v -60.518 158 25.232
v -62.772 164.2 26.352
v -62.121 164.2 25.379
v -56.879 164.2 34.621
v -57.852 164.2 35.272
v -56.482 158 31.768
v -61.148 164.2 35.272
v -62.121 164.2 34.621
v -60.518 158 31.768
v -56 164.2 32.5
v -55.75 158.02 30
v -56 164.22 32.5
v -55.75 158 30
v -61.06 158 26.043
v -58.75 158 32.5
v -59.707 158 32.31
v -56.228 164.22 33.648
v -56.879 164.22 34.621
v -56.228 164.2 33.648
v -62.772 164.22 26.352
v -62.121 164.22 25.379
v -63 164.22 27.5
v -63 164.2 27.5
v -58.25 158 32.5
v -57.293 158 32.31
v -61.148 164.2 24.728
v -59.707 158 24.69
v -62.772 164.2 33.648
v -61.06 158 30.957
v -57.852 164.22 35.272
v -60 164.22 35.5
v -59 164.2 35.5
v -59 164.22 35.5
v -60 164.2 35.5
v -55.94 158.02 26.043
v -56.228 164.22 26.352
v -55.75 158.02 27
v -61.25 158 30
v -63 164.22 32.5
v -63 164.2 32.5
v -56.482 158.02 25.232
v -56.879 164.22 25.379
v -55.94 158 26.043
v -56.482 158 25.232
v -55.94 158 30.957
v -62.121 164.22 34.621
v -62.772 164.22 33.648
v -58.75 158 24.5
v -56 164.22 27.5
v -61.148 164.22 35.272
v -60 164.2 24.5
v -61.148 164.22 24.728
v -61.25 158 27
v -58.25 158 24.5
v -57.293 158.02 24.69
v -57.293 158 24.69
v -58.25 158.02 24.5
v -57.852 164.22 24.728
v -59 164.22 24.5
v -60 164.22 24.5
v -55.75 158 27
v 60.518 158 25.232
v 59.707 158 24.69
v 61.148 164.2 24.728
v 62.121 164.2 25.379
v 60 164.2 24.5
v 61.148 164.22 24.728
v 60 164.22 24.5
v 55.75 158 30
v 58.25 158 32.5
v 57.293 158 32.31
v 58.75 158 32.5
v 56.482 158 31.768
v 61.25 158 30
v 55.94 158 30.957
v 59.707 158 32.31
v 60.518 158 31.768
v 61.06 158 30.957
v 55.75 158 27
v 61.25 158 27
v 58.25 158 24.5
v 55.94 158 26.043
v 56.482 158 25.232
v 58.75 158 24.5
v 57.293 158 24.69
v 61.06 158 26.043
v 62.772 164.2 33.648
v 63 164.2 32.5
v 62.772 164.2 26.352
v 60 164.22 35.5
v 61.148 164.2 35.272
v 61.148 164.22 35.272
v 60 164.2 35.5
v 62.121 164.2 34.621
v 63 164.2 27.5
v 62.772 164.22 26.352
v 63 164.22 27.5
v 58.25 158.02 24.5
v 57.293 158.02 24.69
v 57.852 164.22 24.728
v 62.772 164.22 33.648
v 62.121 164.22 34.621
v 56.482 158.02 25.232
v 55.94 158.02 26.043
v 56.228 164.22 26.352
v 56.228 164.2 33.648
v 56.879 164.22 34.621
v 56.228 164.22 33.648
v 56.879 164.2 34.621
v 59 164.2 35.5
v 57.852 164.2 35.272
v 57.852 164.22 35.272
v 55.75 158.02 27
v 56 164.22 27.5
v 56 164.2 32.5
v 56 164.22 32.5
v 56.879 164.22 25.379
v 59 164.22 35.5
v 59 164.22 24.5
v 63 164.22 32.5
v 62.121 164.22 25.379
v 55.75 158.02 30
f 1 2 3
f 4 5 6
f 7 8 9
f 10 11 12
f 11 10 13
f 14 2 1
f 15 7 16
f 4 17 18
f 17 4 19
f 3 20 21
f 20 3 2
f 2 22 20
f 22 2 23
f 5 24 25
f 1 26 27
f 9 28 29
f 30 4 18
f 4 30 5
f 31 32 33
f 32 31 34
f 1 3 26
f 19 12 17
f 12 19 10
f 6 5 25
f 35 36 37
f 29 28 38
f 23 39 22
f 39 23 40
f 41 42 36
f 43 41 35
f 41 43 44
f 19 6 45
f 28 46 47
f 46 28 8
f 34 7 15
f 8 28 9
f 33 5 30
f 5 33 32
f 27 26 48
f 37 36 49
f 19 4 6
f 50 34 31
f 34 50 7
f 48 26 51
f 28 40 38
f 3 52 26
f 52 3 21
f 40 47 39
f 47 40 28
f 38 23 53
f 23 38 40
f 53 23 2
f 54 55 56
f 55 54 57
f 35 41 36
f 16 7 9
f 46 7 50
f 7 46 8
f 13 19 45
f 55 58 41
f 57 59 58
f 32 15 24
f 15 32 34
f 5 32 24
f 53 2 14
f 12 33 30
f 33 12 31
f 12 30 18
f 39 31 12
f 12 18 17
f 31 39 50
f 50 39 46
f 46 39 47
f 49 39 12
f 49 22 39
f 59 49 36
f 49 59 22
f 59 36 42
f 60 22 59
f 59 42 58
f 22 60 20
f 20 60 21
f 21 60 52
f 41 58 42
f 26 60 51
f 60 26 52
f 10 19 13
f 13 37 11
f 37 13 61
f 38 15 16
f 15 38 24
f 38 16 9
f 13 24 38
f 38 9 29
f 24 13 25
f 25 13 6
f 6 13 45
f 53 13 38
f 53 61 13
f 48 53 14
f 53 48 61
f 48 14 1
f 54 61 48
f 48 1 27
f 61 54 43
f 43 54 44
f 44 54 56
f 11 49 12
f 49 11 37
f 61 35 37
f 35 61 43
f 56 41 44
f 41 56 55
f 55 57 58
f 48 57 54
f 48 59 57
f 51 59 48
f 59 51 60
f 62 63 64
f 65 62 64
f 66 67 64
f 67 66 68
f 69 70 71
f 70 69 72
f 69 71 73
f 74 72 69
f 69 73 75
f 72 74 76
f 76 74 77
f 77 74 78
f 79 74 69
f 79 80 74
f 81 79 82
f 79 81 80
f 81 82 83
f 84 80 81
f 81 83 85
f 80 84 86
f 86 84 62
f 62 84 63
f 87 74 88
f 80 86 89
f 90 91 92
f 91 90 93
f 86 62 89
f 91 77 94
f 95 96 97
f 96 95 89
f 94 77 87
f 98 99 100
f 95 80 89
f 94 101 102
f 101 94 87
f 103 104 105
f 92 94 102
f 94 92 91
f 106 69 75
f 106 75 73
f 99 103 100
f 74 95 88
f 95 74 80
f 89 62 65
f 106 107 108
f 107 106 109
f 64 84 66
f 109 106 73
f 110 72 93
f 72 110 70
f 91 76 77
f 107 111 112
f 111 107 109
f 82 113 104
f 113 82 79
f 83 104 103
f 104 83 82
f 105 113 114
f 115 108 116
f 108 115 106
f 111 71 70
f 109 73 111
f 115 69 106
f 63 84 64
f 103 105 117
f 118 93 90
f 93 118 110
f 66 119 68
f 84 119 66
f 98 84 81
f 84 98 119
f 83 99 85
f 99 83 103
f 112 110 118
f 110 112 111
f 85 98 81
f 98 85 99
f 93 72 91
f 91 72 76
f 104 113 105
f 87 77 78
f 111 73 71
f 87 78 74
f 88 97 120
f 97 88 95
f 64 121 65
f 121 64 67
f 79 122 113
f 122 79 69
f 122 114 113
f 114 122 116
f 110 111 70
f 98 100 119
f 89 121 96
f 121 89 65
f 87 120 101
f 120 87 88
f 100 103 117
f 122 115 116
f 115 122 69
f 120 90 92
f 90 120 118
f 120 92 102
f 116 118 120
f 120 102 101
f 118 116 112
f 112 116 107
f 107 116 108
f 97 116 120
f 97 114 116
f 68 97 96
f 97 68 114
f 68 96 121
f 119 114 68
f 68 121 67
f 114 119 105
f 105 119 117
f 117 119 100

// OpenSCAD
// file: ../lib.scad
// ===== 공용 프리미티브 (params 의존 없음 — use로 포함. 함정 1) =====

// 두 점을 잇는 캡슐. 끝단이 od/2 만큼 뻗는다 (함정 3)
module rod(p1, p2, od, fn = 56)
    hull() { translate(p1) sphere(d = od, $fn = fn);
             translate(p2) sphere(d = od, $fn = fn); }

function mir(p, s = 1) = [s * p.x, p.y, p.z];

// --- 라운디드 사각 2D 폴리곤 (CCW) ---
function arc_pt(cx, cy, r, a) = [cx + r * cos(a), cy + r * sin(a)];
function rrpts(w, h, r, n = 4) =
    let (x = w / 2 - r, y = h / 2 - r)
    concat(
        [for (i = [0:n]) arc_pt( x, -y, r, -90 + 90 * i / n)],
        [for (i = [0:n]) arc_pt( x,  y, r,   0 + 90 * i / n)],
        [for (i = [0:n]) arc_pt(-x,  y, r,  90 + 90 * i / n)],
        [for (i = [0:n]) arc_pt(-x, -y, r, 180 + 90 * i / n)]);

// y 위치의 XZ 단면 슬래브 (중심 x0/zc, 폭 w/높이 h, 모서리 r).
// 회전 매핑: 2D x→차량 X, 2D y→차량 Z, 돌출 +z→−Y (y..y+0.02 전방 전용, 함정 20)
module slabr(y, x0, w, h, zc, r)
    translate([x0, y + 0.02, zc]) rotate([90, 0, 0])
        linear_extrude(0.02) polygon(rrpts(w, h, r));

// 단면 체인 loft: sec = [[y, x0, w, h, zc, r], ...]
module loftr(sec)
    for (i = [0 : len(sec) - 2])
        hull() {
            slabr(sec[i][0],     sec[i][1],     sec[i][2],     sec[i][3],     sec[i][4],     sec[i][5]);
            slabr(sec[i + 1][0], sec[i + 1][1], sec[i + 1][2], sec[i + 1][3], sec[i + 1][4], sec[i + 1][5]);
        }

// 라운디드 박스 (z0..z1 수직, 평면 모서리 r)
module rbox(xc, yc, z0, z1, dx, dy, r, fn = 32)
    hull() for (px = [-1, 1], py = [-1, 1])
        translate([xc + px * (dx / 2 - r), yc + py * (dy / 2 - r), z0])
            cylinder(r = r, h = z1 - z0, $fn = fn);

// --- NACA 계열 에어포일 (LE 원점, 2D +x = 현 방향) ---
function _yt(x, c, t) = 5 * t * c * (0.2969*sqrt(x) - 0.1260*x - 0.3516*x*x
    + 0.2843*x*x*x - 0.1036*x*x*x*x);
function _yc(x, c, m) = 4 * m * c * x * (1 - x);
function naca_pts(c, t, m, n = 12) =
    concat(
        [for (i = [0:n])     let (x = i / n)     [x*c,  _yt(x, c, t) + _yc(x, c, m)]],
        [for (i = [n-1:-1:0]) let (x = i / n)    [x*c, -_yt(x, c, t) + _yc(x, c, m)]]);

// 슬라이스 3D 링: v=[x, yle, zle, c, aoa, th, cam] → 받각 회전된 naca 점의 링
// (th/cam은 mm — 현 대비 비율로 정규화)
function wring(v, n = 12) =
    let (c = v[3], t = v[5] / c, m = v[6] / c, pts = naca_pts(c, t, m, n),
         ca = cos(v[4]), sa = sin(v[4]))
    // 코드 방향 (ca,sa) + 두께/캠버 수직 방향 (-sa,ca) — 2D y 누락 금지
    [for (p = pts) [v[0], v[1] + p[0] * ca - p[1] * sa, v[2] + p[0] * sa + p[1] * ca]];

// 진짜 로프트 윙 — polyhedron 스트립. hull 체인은 캠버진 하면을 볼록 껍질로
// 채워(LE→TE 직선 웨지) 요소가 처지므로 쓰지 않는다
module wing3(sl, n = 12) {
    rings = [for (v = sl) wring(v, n)];
    ns = len(rings);
    m = len(rings[0]);
    pts = [for (r = rings, p = r) p];
    function ix(i, k) = i * m + (k % m);
    faces = concat(
        // 측면 스트립 (사중면 → 삼각형 2) — 외향 노멀 권선(캡과 일치)
        [for (i = [0 : ns - 2], k = [0 : m - 1])
            each [[ix(i, k), ix(i, k + 1), ix(i + 1, k + 1)],
                  [ix(i, k), ix(i + 1, k + 1), ix(i + 1, k)]]],
        // 끝 캡 (링은 단순 폴리곤 — 팬 삼각분할)
        [for (k = [1 : m - 2]) [ix(0, 0), ix(0, k + 1), ix(0, k)]],
        [for (k = [1 : m - 2]) [ix(ns - 1, 0), ix(ns - 1, k), ix(ns - 1, k + 1)]]
    );
    polyhedron(points = pts, faces = faces, convexity = 4);
}

// 반쪽 슬라이스 → x-대칭 전체. 규약: half는 센터(x=0)→팁 순서(내림차순 x).
// 결과는 x 오름차순 체인. x=0 센터만 중복 제외 (그 외 전부 미러)
function wsym(half) =
    concat([for (i = [len(half) - 1 : -1 : 0]) half[i]],
           [for (i = [0 : len(half) - 1]) if (abs(half[i][0]) > 1e-9)
               concat([-half[i][0]], [for (j = [1 : len(half[i]) - 1]) half[i][j]])]);

// 환(링), 축 Z
module ann(r_in, r_out, h, fn = 96)
    difference() { cylinder(r = r_out, h = h, center = true, $fn = fn);
                   cylinder(r = r_in,  h = h + 2, center = true, $fn = fn); }

// 리스트 전체 x반전+순서 역행 (센터 구간 없는 플랩 등 — 좌우 별도 wing3 호출용).
// x반전만 하면 행렬식이 음수가 되어 권선이 뒤집힌다 → 순서 역행으로 상쇄
function msym(half) =
    [for (i = [len(half) - 1 : -1 : 0])
        concat([-half[i][0]], [for (j = [1 : len(half[i]) - 1]) half[i][j]])];
// file: ../params.scad
// =====================================================================
// F1 그랜드파이언스 카 1:10 — 전체 파라미터 (유일한 수정 지점)
// 좌표계: +Y 전방, +X 좌측, +Z 상방, 지면 z=0, 원점=휠베이스 중심
// 전장 558 (y -268..+278), 전폭 194, 휠베이스 360, 타이어 OD 72 (720mm)
// 30부품. loftr 단면 = [y, x0, w, h, zc, r] (XZ 단면, y..y+0.02 슬래브)
// wing3 슬라이스 = [x, yle, zle, c, aoa, th, cam]
//   aoa: 현 방향의 X축 회전각. 전방 받각 요소는 165~170 (TE가 뒤+위)
// =====================================================================
$fn = 96;

// -- 휠/액슬 (실차 720mm 타이어, 18인치 림, 트랙 F1600/R1550) --
AXF_Y = 180;   AXR_Y = -180;
WHF_X = 80;    WHR_X = 77.5;
WH_Z  = 36;
TIRF_W = 30.5; TIRR_W = 40.5;  TIR_R = 36;
TIR_FN = 288;                 // 타이어 회전체 해상도
RIM_R = 23.2;  RIM_T = 1.0;   // 림 배럴 반경/두께
RIM_LF = 12.4; RIM_LR = 17.4; // 림 배럴 반폭
HUB_BORE = 7.0; STUB_D = 6.2; // 방사 간극 0.4
DISC_R = 15.5;                // 브레이크 디스크

// -- 바디 공통 레벨 --
FLO_Z0 = 2.0;  FLO_Z1 = 5.5;  // 플로어 (두께 3.5)
BOD_Z0 = 5.65;                // 샤시/카버/기어박스 바닥 (플로어 위 0.15)
J = 0.15;                     // 부품 접합 기본 간극
ARM_OD = 3.4;                 // 서스펜션 암 캡슐 직경

// ===== 01 플로어 =====
FLOOR_SEC = [
    [132,    0,  92, 3.5, 3.75, 1.5], [100, 0, 118, 3.5, 3.75, 1.5],
    [60,     0, 130, 3.5, 3.75, 2.0], [10,  0, 132, 3.5, 3.75, 2.0],
    [-60,    0, 128, 3.5, 3.75, 2.0], [-120, 0, 112, 3.5, 3.75, 2.0],
    [-161.85, 0, 100, 3.5, 3.75, 2.0]];

// ===== 02 디퓨저 (램프 + 스트레이크는 부품 내부) =====
DIFF_SEC = [
    [-230,   0, 100, 10.0, 11.0, 1.5], [-215, 0, 100, 8.0,  9.0, 1.5],
    [-190,   0, 100,  6.0,  6.2, 1.5], [-162.0, 0, 100, 4.0, 4.15, 1.5]];
DIFF_TOP = [[-175, 7.8], [-205, 11.9], [-228, 15.6]];  // (y, 램프 상면 z)

// ===== 03 플로어 에지 윙 =====
FEW_SEC = [   // [y, x0, w, h, zc, r] — x0 부호로 좌우
    [55,   63.5, 3.0, 2.0, 6.65, 1.0], [-5,  65.5, 3.0, 5.5, 8.40, 1.5],
    [-70,  63.0, 3.0, 4.0, 7.65, 1.5], [-120, 58.0, 3.0, 3.0, 7.15, 1.5]];
FEW2_SEC = [
    [100, 57.0, 2.5, 1.5, 6.40, 0.8], [60, 60.0, 2.5, 2.0, 6.65, 0.8]];

// ===== 04 노우즈 =====
NOSE_SEC = [
    [95,   0, 38, 28, 25.3, 12], [100,  0, 38, 29, 25.3, 12],
    [115,  0, 36, 28, 23.8, 11], [135,  0, 31, 24, 21.3,  9],
    [160,  0, 27, 20, 18.3,  8], [185,  0, 23, 17, 15.8,  7],
    [205,  0, 20, 15, 14.3,  6], [224,  0, 17, 12, 12.3,  5],
    [242,  0, 14,  9, 10.8,  4], [258,  0, 10,  7, 10.1,  3],
    [272,  0,  4.5, 4.5, 9.8, 2], [273.5, 0, 1.2, 1.2, 9.8, 0.6]];

// ===== 05 샤시(모노코크) + 콕핏 컷 =====
CHAS_SEC = [
    [-34.85, 0, 46, 44, 27.65, 15], [-10, 0, 48, 46, 28.65, 15],
    [20,     0, 48, 44, 27.65, 15], [60,  0, 46, 40, 25.65, 14],
    [94.85,  0, 42, 34, 22.65, 12]];
CKP_CUT = [[62, 0, 34, 32, 46, 3], [-30, 0, 34, 30, 45, 3]];

// ===== 06 엔진 커버 + 샤크핀 =====
COV_SEC = [
    [-152,   0,  8, 14, 35.65,  6], [-140, 0, 12, 18, 32.65,  7],
    [-120,   0, 18, 24, 29.65,  9], [-95,  0, 26, 30, 26.15, 11],
    [-70,    0, 34, 36, 25.65, 13], [-50,  0, 40, 40, 25.65, 14],
    [-35.15, 0, 44, 42, 26.65, 15]];
FIN_SEC = [
    [-162, 0, 2.2, 44, 62.0, 1], [-120, 0, 2.5, 30, 56.0, 1],
    [-92.2, 0, 2.5, 10, 45.0, 1]];

// ===== 07 에어박스 (험프 + 인테이크 링) =====
ABX_SEC = [
    [-92, 0, 14, 17, 50.00, 6], [-68, 0, 20, 24, 56.60, 8],
    [-46, 0, 22, 26, 59.60, 8], [-34, 0, 22, 13, 56.30, 6]];
ABX_RING_C = [0, -45, 73.5];  ABX_RING_R = 11;  ABX_RING_T = 4.5;
ABX_RING_SZ = 0.72;

// ===== 08 사이드포드 (x0=±41.5) =====
SPOD_X0 = 41.5;
SPOD_SEC = [   // [y, w, h, zc, r]
    [38,   34, 26, 18.65, 8], [5,   34, 28, 19.65, 9], [-25,  34, 26, 18.65, 9],
    [-55,  32, 21, 18.15, 8], [-80, 30, 15, 17.15, 8], [-100, 26,  9, 16.15, 7]];
SPOD_INLET = [24, 18, 19, 2.3];  // 컷: w, h, zc, 깊이

// ===== 09 할로 =====
HALO_N = 28;  HALO_OD = 9;
HALO_RX = 22; HALO_RY = 44; HALO_CY = 12;  // 타원 계획면(평면도)
HALO_Z0 = 75; HALO_ZA = 2;                 // z(t) = Z0 + ZA*cos(t)

// ===== 10/11/12/13 프런트 윙 =====
FW_MAIN_HALF = [   // 반쪽(x≤0) — wsym()로 전체화
    [0,    258.3, 2.4, 20, 170, 1.4, 2.0],
    [-16,  259.0, 3.4, 27, 165, 1.6, 2.4],
    [-40,  260.0, 3.6, 40, 166, 1.8, 2.8],
    [-60,  257.0, 4.0, 37, 167, 1.7, 2.6],
    [-80,  258.0, 4.4, 31, 166, 1.6, 2.2],
    [-95.2, 263.0, 4.6, 26, 166, 1.5, 1.8]];
FW_F1_HALF = [
    [-16,  253.0, 8.0, 22, 155, 1.3, 4.0],
    [-40,  250.5, 8.2, 26, 156, 1.4, 4.2],
    [-60,  249.5, 8.4, 26, 157, 1.4, 4.2],
    [-80,  250.0, 8.6, 24, 158, 1.4, 4.0],
    [-95.2, 254.0, 8.8, 21, 158, 1.3, 3.5]];
FW_F2_HALF = [
    [-16,  258.0, 12.4, 17, 147, 1.2, 4.5],
    [-40,  255.5, 12.6, 20, 148, 1.3, 4.8],
    [-60,  254.5, 12.8, 20, 149, 1.3, 4.8],
    [-80,  254.5, 13.0, 19, 150, 1.3, 4.5],
    [-95.2, 258.0, 13.2, 17, 150, 1.2, 4.0]];
FW_EP_X = 96.3;  FW_EP_T = 1.5;   // 엔드플레이트 x 중심/두께
FW_EP_PTS = [    // (y,z) 아웃라인
    [226, 1.5], [266, 1.5], [266, 8], [263, 24.5], [252, 24.5],
    [244, 17], [233, 15], [226, 9]];
FW_MT_SEC = [   // 마운트 플레이트 [y, x0(±2.6), w, h, zc, r] — 노우즈 저면 라운딩 회피
    [244, 2.6, 1.6, 1.8, 5.25, 0.5], [250, 2.6, 1.6, 1.8, 5.25, 0.5]];

// ===== 14 리어 윙 =====
RW_MAIN = [
    [-50.8, -212, 57.5, 46, 162, 2.2, -3.5], [-25, -211, 56.6, 47, 162, 2.3, -4.0],
    [0,     -210, 54.2, 47, 162, 2.3, -4.0], [25,  -211, 56.6, 47, 162, 2.3, -4.0],
    [50.8,  -212, 57.5, 46, 162, 2.2, -3.5]];
RW_FLAP = [
    [-49.6, -234,   71.8, 30, 155, 1.8, -4.5],
    [0,     -235.5, 73.0, 30, 155, 1.8, -4.5],
    [49.6,  -234,   71.8, 30, 155, 1.8, -4.5]];
RW_EP_X = 52;  RW_EP_T = 2;
RW_EP_PTS = [
    [-200, 46], [-268, 46], [-268, 60], [-262, 93], [-250, 93],
    [-243, 72], [-218, 64], [-202, 74]];
RW_DRS = [-245, 79.4, 5.0, 2.6, 3.0];   // 팟: y, z, w, h, 두께

// ===== 15 빔 윙 =====
BEAM_E1 = [
    [-50.9, -204.5, 31.5, 16, 162, 1.8, -2.5], [0, -205.5, 30.4, 16, 162, 1.8, -2.5],
    [50.9,  -204.5, 31.5, 16, 162, 1.8, -2.5]];
BEAM_E2 = [
    [-50.9, -210, 36.8, 15, 158, 1.6, -3.0], [0, -211, 35.6, 15, 158, 1.6, -3.0],
    [50.9,  -210, 36.8, 15, 158, 1.6, -3.0]];
BEAM_PLATE = [-214, -200.15, 8.2, 22, 31];  // 마운트 플레이트 y1,y0,x반폭,z0,z1

// ===== 16 리어윙 파일론(쌍둥 스완넥) =====
RW_PYL = [[-158, 55.0], [-190, 58.0], [-212.5, 63.0]];  // (y, z), x=±5.4
RW_PYL_X = 5.4;  RW_PYL_OD = 8;

// ===== 17 미러 =====
MIR_BASE = [14, 63, 46.0];  MIR_HOUSE = [31, 66, 56.5];

// ===== 18 헬멧 =====
HELM_C = [0, 0, 55];  HELM_R = 11.5;
HELM_SC = [1, 1.18, 1.02];

// ===== 19 콕핏 트림 =====
SEAT_SEC  = [[30, 0, 26, 13.2, 36.75, 3], [-10, 0, 26, 13.2, 36.75, 3]];
HREST_SEC = [[12, 0, 32, 15, 53.5, 5], [-20, 0, 32, 15, 53.5, 5]];

// ===== 20 스티어링 휠 =====
SW_C = [0, 40, 47];  SW_TILT = 20;

// ===== 21/22 서스펜션 (픽업=[x, y, z], 암 끝은 업라이트 내부) =====
FUP = [61, 183, 46];  FLO_BALL = [61.5, 181, 24];  FTR = [61.5, 177, 35];
FPU = [61.5, 180, 27];
F_ARM = [   // [픽업, 볼]
    [[12.0, 206, 20.0], FUP],  [[16.0, 152, 23.0], FUP],
    [[11.9, 208,  9.3], FLO_BALL], [[16.3, 150, 12.0], FLO_BALL],
    [[15.6, 162, 14.0], FTR]];
F_PUSH = [[11.8, 198, 24.4], FPU];
RUP = [53.5, -182, 46];  RLO = [54, -179, 23];  RDRIVE_O = [52, -180, 31];
R_ARM = [
    [[13.3, -160, 47.0], RUP], [[13.3, -198, 45.0], RUP],
    [[12.8, -158, 20.4], RLO], [[9.2, -202, 19.6], RLO]];
R_PULL = [[12.6, -177, 23.75], [53.5, -181, 44]];
R_DRIVE = [[13.2, -180, 17.0], RDRIVE_O];

// ===== 23/24 브레이크 스쿱 =====
SCOOP_F = [[164.2, 59.5, 7, 11, 30, 3], [158, 58.5, 5.5, 8, 28.5, 2.5]];
SCOOP_R = [[-164.2, 48, 7, 10, 29, 3], [-158, 46, 5, 7.5, 27.5, 2.5]];

// ===== 25~28 타이어/림 =====
TIRE_BEAD = 2.6;   // 비드 안쪽 세팅 (단면 반경 23.4)

// ===== 29 기어박스 + 리어 크래시 =====
GEAR_SEC = [
    [-258,   0,  4,  1.8, 15.00, 1.5], [-252, 0,  6,  1.6, 16.30, 2],
    [-230,   0,  9,  1.4, 18.30, 3],   [-208, 0, 12,  4.9, 15.05, 4],
    [-195,   0, 16,  9.35, 14.83, 5],   [-170, 0, 20, 15.1, 15.45, 6],
    [-145,   0, 22, 15.95, 13.60, 7],  [-117.85, 0, 26, 8.6,  9.95, 8]];
GEAR_TOWER = [-200, -158, 8, 11.3, 28, 50];  // y1,y0,x내측,x외측,z0,z1
RAIN_LT = [-258.6, 5, 4];   // y면, w, h

// ===== 30 카메라/안테나 =====
TCAM_Y = -45;  TCAM_Z0 = 84.8;
SIDECAM = [[194, 19.0], [202, 18.5]];  // (y, z) — x는 노우즈 반폭+0.15
ANT = [[4, 70], [-4, 70]];             // (x, y) — chassis 탑
// main file
// 23 프런트 브레이크 스쿱 — 업라이트 전방 흡기구 (좌우 1부품)
include <../params.scad>
use <../lib.scad>

module brake_scoop_front()
for (s = [-1, 1])
    loftr([for (r = SCOOP_F) [r[0], s * r[1], r[2], r[3], r[4], r[5]]]);

brake_scoop_front();
